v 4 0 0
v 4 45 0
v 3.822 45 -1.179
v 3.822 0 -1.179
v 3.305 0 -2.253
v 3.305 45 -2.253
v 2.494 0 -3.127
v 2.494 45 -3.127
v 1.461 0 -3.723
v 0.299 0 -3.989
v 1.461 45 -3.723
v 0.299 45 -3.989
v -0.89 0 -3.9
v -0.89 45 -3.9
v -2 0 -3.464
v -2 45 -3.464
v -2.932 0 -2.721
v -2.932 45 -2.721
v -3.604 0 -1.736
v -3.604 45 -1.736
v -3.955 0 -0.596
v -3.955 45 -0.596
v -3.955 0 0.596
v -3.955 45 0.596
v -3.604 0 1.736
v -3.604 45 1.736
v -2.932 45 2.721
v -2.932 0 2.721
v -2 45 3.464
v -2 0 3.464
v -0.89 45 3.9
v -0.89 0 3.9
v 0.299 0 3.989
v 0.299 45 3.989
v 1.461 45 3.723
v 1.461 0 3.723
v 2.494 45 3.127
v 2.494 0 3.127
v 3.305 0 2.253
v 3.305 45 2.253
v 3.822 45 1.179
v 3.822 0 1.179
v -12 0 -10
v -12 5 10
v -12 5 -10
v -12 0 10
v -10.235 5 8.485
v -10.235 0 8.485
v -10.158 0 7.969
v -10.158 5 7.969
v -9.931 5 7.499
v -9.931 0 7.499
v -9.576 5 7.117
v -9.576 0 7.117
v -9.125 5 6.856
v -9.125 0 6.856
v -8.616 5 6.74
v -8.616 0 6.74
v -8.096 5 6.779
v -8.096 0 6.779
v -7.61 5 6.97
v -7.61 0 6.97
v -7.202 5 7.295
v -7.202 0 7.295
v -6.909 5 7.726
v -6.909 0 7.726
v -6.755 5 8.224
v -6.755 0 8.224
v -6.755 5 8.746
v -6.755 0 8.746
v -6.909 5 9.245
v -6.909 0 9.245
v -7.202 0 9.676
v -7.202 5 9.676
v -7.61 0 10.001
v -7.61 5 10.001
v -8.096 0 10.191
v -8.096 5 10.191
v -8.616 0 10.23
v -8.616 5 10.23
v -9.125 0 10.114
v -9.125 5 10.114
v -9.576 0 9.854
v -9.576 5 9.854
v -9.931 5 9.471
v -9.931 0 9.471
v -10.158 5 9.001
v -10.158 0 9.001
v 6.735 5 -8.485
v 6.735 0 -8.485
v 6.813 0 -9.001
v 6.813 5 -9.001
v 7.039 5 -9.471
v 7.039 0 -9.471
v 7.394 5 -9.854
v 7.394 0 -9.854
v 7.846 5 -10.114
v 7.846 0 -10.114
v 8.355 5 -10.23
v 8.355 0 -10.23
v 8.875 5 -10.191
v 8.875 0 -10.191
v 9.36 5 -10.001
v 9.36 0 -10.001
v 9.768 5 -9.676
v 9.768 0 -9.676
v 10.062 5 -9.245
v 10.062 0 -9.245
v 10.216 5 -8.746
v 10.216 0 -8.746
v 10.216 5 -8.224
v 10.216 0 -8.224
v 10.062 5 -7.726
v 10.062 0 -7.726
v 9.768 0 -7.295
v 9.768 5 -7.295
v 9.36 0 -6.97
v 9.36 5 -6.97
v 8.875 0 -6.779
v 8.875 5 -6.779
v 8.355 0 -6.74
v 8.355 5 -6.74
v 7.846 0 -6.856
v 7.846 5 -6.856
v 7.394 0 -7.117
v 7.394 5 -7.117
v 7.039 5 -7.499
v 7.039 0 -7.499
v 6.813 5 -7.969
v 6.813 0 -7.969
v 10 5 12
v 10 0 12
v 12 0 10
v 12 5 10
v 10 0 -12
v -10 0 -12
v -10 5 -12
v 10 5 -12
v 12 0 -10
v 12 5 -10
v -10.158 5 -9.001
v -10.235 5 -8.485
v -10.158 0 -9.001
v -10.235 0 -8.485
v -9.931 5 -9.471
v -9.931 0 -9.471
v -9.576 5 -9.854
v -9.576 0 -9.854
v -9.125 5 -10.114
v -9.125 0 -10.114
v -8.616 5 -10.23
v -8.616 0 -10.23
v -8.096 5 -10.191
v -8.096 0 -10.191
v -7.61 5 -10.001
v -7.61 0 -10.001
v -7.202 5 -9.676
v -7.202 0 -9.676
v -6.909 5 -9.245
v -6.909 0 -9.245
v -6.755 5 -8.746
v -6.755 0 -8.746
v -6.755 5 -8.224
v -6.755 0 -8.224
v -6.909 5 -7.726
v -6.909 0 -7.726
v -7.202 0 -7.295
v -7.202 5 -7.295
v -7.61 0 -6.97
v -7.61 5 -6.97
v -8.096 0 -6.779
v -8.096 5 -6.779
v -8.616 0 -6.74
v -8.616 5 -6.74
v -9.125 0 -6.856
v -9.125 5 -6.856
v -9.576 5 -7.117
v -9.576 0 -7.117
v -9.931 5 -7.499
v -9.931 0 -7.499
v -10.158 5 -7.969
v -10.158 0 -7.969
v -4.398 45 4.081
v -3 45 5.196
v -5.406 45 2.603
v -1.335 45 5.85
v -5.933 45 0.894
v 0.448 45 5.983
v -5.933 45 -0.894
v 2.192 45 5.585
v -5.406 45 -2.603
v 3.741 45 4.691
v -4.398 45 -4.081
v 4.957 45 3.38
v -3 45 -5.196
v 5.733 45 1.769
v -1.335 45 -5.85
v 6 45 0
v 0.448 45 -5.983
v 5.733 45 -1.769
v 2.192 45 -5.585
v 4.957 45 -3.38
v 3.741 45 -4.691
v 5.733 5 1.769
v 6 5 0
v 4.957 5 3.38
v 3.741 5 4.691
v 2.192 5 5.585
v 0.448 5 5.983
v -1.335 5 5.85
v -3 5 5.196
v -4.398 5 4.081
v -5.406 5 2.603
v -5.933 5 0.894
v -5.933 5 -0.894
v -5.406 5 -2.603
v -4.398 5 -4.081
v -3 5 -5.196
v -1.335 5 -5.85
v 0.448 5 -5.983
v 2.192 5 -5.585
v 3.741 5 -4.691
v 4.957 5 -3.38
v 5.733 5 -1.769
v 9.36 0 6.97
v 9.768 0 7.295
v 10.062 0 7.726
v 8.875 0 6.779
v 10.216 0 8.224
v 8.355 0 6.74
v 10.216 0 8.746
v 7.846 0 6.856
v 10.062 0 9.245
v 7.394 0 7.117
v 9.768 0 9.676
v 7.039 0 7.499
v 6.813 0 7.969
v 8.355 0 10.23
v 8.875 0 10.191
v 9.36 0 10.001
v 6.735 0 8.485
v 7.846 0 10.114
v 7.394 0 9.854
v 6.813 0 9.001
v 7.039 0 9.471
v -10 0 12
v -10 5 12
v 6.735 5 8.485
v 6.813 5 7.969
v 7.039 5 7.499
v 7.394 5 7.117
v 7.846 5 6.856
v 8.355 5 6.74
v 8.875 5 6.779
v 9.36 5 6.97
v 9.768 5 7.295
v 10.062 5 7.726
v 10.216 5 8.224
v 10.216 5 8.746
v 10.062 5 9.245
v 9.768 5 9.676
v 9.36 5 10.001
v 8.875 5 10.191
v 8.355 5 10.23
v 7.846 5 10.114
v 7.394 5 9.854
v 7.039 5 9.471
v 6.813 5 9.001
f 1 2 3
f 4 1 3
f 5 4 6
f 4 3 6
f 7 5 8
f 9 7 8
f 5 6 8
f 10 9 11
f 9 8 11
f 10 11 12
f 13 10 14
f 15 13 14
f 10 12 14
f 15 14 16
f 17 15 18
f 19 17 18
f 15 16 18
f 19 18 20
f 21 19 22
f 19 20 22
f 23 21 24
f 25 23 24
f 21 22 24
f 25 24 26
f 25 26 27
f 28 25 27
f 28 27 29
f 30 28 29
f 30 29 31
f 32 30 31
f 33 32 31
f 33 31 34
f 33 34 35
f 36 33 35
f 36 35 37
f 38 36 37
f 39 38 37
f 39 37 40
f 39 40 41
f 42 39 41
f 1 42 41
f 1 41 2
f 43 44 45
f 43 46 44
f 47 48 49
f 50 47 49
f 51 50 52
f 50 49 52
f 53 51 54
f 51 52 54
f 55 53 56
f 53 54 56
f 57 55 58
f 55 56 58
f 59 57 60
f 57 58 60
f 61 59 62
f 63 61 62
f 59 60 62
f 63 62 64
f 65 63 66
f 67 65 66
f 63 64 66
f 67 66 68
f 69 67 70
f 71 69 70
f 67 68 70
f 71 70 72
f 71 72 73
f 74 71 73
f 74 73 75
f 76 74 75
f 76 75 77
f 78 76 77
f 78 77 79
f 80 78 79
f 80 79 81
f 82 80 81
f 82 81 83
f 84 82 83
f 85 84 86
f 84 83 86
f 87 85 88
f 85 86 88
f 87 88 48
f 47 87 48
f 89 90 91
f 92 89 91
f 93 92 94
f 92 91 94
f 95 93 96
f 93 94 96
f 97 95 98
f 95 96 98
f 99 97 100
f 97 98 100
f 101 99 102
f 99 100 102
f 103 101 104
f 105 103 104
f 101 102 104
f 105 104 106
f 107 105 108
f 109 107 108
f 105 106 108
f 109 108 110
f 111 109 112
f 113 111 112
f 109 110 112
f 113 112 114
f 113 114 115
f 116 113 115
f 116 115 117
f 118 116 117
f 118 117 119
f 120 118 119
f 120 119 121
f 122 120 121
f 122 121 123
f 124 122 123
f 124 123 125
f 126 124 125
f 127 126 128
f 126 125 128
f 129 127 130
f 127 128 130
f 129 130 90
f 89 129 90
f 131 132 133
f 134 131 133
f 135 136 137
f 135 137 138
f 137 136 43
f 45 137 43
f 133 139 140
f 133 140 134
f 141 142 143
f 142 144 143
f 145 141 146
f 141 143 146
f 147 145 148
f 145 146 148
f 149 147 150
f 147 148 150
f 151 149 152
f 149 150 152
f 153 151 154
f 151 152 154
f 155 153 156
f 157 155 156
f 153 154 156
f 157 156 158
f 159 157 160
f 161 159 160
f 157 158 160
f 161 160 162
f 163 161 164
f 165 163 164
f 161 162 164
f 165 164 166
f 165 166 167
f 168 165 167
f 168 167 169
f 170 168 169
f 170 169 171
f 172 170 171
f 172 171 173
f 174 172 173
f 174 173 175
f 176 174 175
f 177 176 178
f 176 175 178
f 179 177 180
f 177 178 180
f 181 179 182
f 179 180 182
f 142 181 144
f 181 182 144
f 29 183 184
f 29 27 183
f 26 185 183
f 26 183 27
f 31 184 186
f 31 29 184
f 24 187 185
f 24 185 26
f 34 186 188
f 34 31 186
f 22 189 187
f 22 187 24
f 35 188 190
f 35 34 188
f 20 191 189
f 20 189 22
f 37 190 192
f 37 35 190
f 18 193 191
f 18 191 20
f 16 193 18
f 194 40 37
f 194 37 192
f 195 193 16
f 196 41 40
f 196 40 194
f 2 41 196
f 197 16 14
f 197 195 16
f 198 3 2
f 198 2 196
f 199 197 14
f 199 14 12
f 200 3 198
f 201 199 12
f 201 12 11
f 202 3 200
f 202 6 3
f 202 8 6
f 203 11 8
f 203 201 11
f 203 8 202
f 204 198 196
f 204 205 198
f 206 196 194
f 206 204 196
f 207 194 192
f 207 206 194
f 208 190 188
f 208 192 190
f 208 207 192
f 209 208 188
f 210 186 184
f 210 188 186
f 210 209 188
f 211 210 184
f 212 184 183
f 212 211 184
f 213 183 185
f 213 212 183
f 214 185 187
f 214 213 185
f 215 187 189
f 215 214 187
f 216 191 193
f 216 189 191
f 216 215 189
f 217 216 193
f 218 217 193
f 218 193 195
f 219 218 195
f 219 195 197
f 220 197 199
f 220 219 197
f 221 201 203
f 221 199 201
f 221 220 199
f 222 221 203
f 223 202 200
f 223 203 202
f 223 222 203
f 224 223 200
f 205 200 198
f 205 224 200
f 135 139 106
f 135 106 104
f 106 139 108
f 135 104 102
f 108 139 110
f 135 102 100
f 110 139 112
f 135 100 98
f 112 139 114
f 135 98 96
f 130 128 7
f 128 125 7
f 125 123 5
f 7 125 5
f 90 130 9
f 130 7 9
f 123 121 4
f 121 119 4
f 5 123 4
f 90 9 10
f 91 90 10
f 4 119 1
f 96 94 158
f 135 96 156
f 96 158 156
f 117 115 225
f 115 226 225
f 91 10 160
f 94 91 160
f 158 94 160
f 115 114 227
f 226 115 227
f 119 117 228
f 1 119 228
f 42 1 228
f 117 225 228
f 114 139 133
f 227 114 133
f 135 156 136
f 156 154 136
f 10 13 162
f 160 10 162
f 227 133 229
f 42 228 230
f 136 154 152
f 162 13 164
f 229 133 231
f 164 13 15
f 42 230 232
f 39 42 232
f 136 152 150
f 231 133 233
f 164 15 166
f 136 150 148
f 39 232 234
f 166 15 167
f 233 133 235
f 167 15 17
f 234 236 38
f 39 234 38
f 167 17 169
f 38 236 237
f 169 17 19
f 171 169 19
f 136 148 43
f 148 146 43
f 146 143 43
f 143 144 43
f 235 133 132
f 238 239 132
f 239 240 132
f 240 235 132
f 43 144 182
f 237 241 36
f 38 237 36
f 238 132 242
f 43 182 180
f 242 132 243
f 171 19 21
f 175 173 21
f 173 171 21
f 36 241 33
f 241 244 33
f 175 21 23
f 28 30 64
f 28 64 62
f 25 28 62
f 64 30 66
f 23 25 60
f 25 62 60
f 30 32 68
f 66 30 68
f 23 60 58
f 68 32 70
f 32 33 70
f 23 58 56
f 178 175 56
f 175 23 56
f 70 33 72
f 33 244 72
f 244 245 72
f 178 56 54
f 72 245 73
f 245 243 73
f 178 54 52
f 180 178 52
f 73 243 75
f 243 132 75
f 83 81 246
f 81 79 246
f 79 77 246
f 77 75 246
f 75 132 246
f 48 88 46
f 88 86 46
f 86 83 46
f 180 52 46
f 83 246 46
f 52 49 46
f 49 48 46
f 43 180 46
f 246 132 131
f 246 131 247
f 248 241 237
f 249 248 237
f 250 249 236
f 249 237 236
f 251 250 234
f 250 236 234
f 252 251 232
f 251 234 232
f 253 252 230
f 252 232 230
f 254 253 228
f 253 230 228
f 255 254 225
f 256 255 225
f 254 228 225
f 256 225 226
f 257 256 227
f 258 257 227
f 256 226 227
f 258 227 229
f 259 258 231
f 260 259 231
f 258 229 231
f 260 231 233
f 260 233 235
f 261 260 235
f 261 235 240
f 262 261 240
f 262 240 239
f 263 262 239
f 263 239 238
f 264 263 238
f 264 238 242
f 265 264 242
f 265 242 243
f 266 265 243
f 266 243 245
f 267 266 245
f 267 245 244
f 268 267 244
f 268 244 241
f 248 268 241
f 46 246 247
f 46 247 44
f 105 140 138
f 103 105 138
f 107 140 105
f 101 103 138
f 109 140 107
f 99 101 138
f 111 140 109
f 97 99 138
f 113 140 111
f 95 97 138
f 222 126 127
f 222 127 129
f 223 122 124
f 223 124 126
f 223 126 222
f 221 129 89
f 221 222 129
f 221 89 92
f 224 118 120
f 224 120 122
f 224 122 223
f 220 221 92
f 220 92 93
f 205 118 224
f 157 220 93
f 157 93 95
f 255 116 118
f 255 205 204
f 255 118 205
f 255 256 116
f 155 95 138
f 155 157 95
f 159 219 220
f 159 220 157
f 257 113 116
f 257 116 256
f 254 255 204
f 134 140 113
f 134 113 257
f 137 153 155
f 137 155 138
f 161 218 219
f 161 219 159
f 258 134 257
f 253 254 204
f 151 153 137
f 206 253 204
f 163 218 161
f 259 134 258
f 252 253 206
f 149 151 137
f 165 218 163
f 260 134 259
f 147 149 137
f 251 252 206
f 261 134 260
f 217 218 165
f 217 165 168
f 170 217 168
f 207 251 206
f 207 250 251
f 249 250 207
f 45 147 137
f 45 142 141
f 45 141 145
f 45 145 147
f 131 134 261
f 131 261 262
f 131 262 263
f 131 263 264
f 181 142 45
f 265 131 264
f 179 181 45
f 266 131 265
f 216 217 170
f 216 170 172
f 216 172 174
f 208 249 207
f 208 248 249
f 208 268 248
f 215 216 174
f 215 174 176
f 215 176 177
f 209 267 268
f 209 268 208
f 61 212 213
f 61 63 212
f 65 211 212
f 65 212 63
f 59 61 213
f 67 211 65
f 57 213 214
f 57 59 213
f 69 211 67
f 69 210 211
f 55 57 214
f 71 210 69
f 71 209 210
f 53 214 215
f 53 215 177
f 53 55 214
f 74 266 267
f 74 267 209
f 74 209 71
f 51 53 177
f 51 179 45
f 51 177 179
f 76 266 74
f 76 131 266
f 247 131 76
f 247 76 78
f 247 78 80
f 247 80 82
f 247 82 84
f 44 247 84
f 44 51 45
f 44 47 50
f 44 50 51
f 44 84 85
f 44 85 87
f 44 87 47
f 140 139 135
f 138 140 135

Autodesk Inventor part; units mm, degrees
ref_plane "YZ Plane" through (0, 0, 0) normal (1, 0, 0) x (0, 1, 0)
ref_plane "XZ Plane" through (0, 0, 0) normal (0, 1, 0) x (-1, 0, 0)
ref_plane "XY Plane" through (0, 0, 0) normal (0, 0, 1) x (1, 0, 0)
sketch "Sketch1" plane through (0, 0, 0) normal (0, 1, 0) x (-1, 0, 0)
  line L0 (10, -12) -> (-10, -12)
  line L1 (-12, -10) -> (-12, 10)
  line L2 (-10, 12) -> (10, 12)
  line L3 (12, 10) -> (12, -10)
  line L4 (12, -12) -> (-12, 12) construction
  line L5 (-12, -12) -> (12, 12) construction
  line L6 (8.4853, -8.4853) -> (6.7353, -8.4853)
  line L7 (-8.4853, -8.4853) -> (-8.4853, -6.7353)
  line L8 (-8.4853, 8.4853) -> (-6.7353, 8.4853)
  line L9 (8.4853, 8.4853) -> (8.4853, 6.7353)
  line L10 (8.4853, -8.4853) -> (-8.4853, 8.4853) construction
  line L11 (-8.4853, -8.4853) -> (8.4853, 8.4853) construction
  circle A0 centre (-8.4853, 8.4853) radius 1.75
  circle A1 centre (8.4853, 8.4853) radius 1.75
  circle A2 centre (-8.4853, -8.4853) radius 1.75
  circle A3 centre (8.4853, -8.4853) radius 1.75
  line L12 (-10, 12) -> (-12, 10)
  line L13 (-12, -10) -> (-10, -12)
  line L14 (10, -12) -> (12, -10)
  line L15 (10, 12) -> (12, 10)
  line L16 (-6.7353, 8.4853) -> (6.7353, 8.4853)
  line L17 (6.7353, 8.4853) -> (8.4853, 8.4853)
  line L18 (-8.4853, 6.7353) -> (-8.4853, 8.4853)
  line L19 (-8.4853, -6.7353) -> (-8.4853, 6.7353)
  line L20 (-6.7353, -8.4853) -> (-8.4853, -8.4853)
  line L21 (6.7353, -8.4853) -> (-6.7353, -8.4853)
  line L22 (8.4853, -6.7353) -> (8.4853, -8.4853)
  line L23 (8.4853, 6.7353) -> (8.4853, -6.7353)
  point P0 (0, 0)
  dimension "d0" = 24
  dimension "d1" = 24
  dimension "d2" = 12
  dimension "d3" = 3.5
  dimension "d4" = 3.5
  dimension "d5" = 3.5
  dimension "d6" = 3.5
  dimension "d7" = 2
  dimension "d8" = 2
  dimension "d9" = 2
  dimension "d10" = 2
  dimension "d11" = 2
  dimension "d12" = 2
  dimension "d13" = 2
  dimension "d14" = 2
extrude "Extrusion1" add sketch "Sketch1" along normal blind 5 contours L0 L13 L1 L12 L2 L15 L3 L14 | L21 A2 L19 A0 L16 A1 L23 A3
sketch "Sketch2" plane through (0, 5, 0) normal (0, 1, 0) x (1, 0, 0)
  circle A0 centre (0, 0) radius 6
  dimension "d17" = 12
extrude "Extrusion2" add sketch "Sketch2" along normal blind 40
sketch "Sketch3" plane through (0, 45, 0) normal (0, 1, 0) x (1, 0, 0)
  circle A0 centre (0, 0) radius 6 projected
  circle A1 centre (0, 0) radius 4
  dimension "d20" = 8
extrude "Extrusion3" cut sketch "Sketch3" against normal through all contours A1
equation "\"d8\" = d7"
equation "\"d9\" = d7"
equation "\"d10\" = d9"
equation "\"d11\" = d7"
equation "\"d12\" = d11"
equation "\"d13\" = d7"
equation "\"d14\" = d13"
properties part number "lm8kuu"
